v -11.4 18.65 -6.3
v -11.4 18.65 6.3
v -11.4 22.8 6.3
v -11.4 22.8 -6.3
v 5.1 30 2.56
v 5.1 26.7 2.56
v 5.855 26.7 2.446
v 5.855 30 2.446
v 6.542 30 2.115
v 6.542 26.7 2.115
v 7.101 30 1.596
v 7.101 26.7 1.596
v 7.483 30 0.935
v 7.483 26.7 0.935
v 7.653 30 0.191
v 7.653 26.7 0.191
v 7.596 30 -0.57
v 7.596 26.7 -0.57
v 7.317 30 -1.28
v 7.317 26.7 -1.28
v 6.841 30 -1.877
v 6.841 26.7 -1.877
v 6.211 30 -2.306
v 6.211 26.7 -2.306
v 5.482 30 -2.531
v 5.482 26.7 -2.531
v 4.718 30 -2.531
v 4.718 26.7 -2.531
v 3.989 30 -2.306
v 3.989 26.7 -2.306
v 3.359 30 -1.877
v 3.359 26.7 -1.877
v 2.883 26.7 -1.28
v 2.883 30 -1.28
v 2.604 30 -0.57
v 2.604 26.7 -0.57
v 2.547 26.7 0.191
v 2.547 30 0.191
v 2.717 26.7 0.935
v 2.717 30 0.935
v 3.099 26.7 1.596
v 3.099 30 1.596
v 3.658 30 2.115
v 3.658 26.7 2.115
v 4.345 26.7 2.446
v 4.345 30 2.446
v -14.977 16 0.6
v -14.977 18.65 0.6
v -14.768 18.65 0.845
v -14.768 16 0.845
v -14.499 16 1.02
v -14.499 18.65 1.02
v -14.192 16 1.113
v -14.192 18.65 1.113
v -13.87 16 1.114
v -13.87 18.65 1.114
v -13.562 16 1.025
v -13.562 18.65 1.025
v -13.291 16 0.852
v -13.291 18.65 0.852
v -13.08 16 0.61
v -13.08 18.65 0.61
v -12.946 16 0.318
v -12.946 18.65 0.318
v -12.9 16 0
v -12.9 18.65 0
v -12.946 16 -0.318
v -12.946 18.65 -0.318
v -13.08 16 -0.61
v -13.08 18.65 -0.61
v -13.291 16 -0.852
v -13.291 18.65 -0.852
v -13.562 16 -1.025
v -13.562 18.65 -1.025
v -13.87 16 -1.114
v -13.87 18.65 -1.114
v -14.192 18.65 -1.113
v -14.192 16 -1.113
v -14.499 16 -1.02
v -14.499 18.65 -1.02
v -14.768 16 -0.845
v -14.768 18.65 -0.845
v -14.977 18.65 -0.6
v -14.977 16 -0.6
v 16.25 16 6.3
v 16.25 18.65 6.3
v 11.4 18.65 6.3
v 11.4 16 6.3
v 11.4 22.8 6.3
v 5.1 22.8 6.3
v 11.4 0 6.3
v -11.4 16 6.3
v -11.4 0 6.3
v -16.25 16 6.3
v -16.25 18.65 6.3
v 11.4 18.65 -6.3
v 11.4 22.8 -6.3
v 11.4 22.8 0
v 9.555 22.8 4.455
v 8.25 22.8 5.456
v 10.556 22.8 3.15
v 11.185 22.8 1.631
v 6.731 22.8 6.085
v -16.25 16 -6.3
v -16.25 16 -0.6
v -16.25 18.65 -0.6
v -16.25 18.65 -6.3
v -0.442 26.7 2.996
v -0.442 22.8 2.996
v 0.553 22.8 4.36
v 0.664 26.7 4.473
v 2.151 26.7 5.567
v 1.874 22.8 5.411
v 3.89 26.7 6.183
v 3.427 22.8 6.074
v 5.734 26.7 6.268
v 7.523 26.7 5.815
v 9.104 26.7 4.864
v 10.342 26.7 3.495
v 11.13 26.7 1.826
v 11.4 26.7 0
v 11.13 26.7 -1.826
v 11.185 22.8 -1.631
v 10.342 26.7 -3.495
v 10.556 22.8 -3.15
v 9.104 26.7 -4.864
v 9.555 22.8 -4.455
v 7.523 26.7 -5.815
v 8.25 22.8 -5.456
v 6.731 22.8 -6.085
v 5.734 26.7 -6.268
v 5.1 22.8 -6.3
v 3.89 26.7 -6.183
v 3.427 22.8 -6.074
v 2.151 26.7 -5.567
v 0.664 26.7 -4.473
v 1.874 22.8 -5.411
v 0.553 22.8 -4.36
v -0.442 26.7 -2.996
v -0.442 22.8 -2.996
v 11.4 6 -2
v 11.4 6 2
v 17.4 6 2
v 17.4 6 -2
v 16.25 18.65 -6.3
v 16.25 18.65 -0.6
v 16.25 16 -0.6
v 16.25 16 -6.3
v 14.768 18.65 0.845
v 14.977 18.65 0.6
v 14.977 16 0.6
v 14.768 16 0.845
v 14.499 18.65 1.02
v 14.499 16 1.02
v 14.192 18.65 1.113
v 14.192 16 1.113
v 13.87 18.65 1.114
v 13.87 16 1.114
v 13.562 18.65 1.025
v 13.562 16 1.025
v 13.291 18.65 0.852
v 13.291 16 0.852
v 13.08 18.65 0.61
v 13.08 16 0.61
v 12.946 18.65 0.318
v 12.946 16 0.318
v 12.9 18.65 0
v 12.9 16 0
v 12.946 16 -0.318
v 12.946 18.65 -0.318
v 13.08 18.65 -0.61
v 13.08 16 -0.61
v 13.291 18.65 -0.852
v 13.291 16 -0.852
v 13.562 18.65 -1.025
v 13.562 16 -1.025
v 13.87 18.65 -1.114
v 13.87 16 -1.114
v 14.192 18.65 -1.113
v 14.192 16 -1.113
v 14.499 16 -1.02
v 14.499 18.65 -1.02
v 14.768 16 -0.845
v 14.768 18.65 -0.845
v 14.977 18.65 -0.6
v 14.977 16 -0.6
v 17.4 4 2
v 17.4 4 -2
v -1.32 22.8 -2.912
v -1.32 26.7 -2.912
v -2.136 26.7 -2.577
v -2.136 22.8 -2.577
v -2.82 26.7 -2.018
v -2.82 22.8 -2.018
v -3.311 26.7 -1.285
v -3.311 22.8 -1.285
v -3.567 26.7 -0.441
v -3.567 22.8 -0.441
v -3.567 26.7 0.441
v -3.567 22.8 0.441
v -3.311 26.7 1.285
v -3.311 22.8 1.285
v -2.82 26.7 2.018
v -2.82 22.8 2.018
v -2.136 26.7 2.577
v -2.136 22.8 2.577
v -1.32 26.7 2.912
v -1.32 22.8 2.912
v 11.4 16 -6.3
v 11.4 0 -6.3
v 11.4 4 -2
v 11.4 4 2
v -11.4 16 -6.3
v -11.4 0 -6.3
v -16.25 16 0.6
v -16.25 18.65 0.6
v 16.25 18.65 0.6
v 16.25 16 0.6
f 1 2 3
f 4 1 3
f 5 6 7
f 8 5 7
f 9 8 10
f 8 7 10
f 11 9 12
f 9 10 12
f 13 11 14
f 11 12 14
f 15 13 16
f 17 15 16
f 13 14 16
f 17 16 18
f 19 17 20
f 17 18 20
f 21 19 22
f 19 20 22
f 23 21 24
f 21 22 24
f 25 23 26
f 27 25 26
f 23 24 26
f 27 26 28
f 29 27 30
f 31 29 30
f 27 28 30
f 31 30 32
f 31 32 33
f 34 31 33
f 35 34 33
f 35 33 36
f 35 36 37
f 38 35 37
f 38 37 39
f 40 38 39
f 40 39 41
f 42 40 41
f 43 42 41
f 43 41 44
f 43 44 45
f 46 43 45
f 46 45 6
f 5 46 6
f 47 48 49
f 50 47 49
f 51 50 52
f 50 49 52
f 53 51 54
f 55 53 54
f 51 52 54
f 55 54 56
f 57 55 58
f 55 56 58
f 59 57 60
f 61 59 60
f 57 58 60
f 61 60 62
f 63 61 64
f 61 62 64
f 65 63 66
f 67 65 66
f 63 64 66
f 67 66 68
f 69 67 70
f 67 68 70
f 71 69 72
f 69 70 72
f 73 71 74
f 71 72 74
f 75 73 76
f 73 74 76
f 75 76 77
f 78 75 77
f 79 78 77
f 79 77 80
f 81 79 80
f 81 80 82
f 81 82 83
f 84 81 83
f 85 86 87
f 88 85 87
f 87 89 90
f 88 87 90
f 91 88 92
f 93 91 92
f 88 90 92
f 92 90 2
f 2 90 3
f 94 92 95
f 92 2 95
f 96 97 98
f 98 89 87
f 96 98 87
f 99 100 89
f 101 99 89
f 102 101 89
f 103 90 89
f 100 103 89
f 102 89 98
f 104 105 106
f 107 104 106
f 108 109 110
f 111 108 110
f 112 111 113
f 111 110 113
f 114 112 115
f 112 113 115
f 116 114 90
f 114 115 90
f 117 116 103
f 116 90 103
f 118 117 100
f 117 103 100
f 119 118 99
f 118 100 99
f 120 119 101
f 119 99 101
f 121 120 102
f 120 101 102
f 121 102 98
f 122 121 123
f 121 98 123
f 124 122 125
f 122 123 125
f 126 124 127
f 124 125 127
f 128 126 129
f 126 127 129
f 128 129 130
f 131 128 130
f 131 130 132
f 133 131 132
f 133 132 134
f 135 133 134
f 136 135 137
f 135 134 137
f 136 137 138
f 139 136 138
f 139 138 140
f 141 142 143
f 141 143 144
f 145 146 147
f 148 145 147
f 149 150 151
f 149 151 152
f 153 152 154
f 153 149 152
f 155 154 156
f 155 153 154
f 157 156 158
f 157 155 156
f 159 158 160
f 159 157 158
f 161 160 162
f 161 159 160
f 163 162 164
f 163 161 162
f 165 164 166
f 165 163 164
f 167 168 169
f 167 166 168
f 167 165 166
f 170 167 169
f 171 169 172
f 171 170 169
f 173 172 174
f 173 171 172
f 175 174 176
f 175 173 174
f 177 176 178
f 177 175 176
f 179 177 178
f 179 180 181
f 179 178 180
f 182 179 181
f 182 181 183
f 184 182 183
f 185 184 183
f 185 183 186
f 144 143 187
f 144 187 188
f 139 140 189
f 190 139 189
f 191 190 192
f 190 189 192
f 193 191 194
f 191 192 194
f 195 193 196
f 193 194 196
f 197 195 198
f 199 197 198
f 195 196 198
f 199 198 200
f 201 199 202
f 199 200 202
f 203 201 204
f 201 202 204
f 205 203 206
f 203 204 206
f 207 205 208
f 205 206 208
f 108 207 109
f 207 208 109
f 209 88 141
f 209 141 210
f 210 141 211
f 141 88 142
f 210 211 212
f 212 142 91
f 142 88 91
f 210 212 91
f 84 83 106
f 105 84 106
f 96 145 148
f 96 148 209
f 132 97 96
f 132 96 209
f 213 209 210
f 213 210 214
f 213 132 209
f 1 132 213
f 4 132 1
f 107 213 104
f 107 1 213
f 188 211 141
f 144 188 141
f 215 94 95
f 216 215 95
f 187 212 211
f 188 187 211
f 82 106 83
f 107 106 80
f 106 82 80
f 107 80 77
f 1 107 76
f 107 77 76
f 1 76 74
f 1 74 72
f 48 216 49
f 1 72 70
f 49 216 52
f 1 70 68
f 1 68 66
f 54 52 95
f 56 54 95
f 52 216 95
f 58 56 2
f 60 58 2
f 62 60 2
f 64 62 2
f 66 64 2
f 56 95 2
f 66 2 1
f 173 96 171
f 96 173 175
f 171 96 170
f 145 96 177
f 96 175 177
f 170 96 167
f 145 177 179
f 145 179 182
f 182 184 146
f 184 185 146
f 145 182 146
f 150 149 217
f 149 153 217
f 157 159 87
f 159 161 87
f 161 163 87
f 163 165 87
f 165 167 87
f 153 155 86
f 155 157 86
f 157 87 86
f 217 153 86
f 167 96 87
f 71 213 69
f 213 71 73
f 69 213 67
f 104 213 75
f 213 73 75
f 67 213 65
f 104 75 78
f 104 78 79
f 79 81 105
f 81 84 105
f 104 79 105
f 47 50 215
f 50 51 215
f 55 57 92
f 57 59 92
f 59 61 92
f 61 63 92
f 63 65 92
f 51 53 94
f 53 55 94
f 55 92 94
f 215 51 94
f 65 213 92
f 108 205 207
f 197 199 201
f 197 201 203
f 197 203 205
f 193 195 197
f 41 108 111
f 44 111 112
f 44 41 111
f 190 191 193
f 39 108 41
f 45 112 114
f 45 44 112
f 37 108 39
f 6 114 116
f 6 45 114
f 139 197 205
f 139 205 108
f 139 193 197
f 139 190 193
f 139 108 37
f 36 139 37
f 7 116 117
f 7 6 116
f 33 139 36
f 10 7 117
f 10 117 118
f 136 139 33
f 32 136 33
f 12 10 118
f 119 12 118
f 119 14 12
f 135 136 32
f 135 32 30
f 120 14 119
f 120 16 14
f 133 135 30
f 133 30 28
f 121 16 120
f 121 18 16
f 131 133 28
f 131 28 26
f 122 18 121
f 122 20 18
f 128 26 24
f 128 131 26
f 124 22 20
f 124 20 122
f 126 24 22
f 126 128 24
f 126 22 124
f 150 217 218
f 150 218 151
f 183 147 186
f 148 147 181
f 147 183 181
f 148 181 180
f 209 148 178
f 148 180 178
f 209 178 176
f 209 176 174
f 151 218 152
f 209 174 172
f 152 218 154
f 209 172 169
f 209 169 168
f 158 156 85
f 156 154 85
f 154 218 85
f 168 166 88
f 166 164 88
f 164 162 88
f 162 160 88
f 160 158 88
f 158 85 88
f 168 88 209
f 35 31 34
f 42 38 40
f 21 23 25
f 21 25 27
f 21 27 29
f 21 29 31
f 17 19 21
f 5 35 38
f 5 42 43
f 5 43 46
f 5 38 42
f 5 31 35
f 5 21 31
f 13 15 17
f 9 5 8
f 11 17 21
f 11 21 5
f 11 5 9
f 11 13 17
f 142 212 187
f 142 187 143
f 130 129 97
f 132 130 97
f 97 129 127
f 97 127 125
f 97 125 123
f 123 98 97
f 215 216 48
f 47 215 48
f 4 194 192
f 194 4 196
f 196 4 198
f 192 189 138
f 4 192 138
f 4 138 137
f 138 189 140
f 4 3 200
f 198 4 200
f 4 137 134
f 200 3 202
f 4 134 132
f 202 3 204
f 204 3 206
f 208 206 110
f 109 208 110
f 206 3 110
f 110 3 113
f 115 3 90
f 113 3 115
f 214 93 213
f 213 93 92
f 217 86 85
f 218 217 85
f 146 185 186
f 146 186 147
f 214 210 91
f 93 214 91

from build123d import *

# Parameters (mm, degrees)
BODY_DEPTH     = 6.3
HUB_BODY_DEPTH = 3.9
HUB_START      = -26.7
SKETCH3_R      = 2.56
HUB_DEPTH      = 30
HOLES_REACH    = 27.526
SKETCH5_W      = 4
SKETCH5_H      = 2
WIRES_2_DEPTH  = 6


with BuildPart() as part:
    # front body → body (new, symmetric)
    with BuildSketch(Plane.XY):
        Polygon((-11.4, 22.8), (11.4, 22.8), (11.4, 18.65), (16.25, 18.65), (16.25, 16), (11.4, 16), (11.4, 0), (-11.4, 0), (-11.4, 16), (-16.25, 16), (-16.25, 18.65), (-11.4, 18.65), align=None)
    extrude(amount=BODY_DEPTH, both=True)

    # Sketch2 → hub body (add)
    with BuildSketch(Plane(origin=(0, 22.8, 0), x_dir=(1, 0, 0), z_dir=(0, 1, 0))):
        with BuildLine():
            ThreePointArc((-0.442105263, -2.995841994), (11.4, 0), (-0.442105263, 2.995841994))
            ThreePointArc((-0.442105263, 2.995841994), (-3.6, 0), (-0.442105263, -2.995841994))
        make_face()
    extrude(amount=HUB_BODY_DEPTH)

    # Sketch3 → hub (add)
    with BuildSketch(Plane(origin=(0, 26.7, 0), x_dir=(1, 0, 0), z_dir=(0, 1, 0)).offset(HUB_START)):
        with Locations(Location((5.1, 0, 0), (0, 0, 270))):
            Circle(SKETCH3_R)
    extrude(amount=HUB_DEPTH)

    # mounting holes → holes (cut, up to next)
    with BuildSketch(Plane(origin=(0, 18.65, 0), x_dir=(1, 0, 0), z_dir=(0, 1, 0)), mode=Mode.PRIVATE) as holes_sk1:
        with BuildLine():
            Line((-14.976643316, 0.6), (-16.25, 0.6))
            Line((-16.25, 0.6), (-16.25, -0.6))
            Line((-16.25, -0.6), (-14.976643316, -0.6))
            ThreePointArc((-14.976643316, -0.6), (-12.9, 0), (-14.976643316, 0.6))
        make_face()
    holes_tool1 = extrude(holes_sk1.sketch, amount=-HOLES_REACH, mode=Mode.PRIVATE) & part.part
    # mounting holes → holes (cut, up to next)
    with BuildSketch(Plane(origin=(0, 18.65, 0), x_dir=(1, 0, 0), z_dir=(0, 1, 0)), mode=Mode.PRIVATE) as holes_sk2:
        with BuildLine():
            Line((16.25, 0.6), (16.25, -0.6))
            Line((16.25, -0.6), (14.976643316, -0.6))
            ThreePointArc((14.976643316, -0.6), (12.9, 0), (14.976643316, 0.6))
            Line((14.976643316, 0.6), (16.25, 0.6))
        make_face()
    holes_tool2 = extrude(holes_sk2.sketch, amount=-HOLES_REACH, mode=Mode.PRIVATE) & part.part
    add(holes_tool1.solids().sort_by_distance((-14.450684, 18.65, 0))[0], mode=Mode.SUBTRACT)
    add(holes_tool2.solids().sort_by_distance((14.450684, 18.65, 0))[0], mode=Mode.SUBTRACT)

    # Sketch5 → Wires 2 (add)
    with BuildSketch(Plane(origin=(11.4, 0, 0), x_dir=(0, 0, -1), z_dir=(1, 0, 0))):
        with Locations((0, 5)):
            Rectangle(SKETCH5_W, SKETCH5_H)
    extrude(amount=WIRES_2_DEPTH)


solid = part.part
